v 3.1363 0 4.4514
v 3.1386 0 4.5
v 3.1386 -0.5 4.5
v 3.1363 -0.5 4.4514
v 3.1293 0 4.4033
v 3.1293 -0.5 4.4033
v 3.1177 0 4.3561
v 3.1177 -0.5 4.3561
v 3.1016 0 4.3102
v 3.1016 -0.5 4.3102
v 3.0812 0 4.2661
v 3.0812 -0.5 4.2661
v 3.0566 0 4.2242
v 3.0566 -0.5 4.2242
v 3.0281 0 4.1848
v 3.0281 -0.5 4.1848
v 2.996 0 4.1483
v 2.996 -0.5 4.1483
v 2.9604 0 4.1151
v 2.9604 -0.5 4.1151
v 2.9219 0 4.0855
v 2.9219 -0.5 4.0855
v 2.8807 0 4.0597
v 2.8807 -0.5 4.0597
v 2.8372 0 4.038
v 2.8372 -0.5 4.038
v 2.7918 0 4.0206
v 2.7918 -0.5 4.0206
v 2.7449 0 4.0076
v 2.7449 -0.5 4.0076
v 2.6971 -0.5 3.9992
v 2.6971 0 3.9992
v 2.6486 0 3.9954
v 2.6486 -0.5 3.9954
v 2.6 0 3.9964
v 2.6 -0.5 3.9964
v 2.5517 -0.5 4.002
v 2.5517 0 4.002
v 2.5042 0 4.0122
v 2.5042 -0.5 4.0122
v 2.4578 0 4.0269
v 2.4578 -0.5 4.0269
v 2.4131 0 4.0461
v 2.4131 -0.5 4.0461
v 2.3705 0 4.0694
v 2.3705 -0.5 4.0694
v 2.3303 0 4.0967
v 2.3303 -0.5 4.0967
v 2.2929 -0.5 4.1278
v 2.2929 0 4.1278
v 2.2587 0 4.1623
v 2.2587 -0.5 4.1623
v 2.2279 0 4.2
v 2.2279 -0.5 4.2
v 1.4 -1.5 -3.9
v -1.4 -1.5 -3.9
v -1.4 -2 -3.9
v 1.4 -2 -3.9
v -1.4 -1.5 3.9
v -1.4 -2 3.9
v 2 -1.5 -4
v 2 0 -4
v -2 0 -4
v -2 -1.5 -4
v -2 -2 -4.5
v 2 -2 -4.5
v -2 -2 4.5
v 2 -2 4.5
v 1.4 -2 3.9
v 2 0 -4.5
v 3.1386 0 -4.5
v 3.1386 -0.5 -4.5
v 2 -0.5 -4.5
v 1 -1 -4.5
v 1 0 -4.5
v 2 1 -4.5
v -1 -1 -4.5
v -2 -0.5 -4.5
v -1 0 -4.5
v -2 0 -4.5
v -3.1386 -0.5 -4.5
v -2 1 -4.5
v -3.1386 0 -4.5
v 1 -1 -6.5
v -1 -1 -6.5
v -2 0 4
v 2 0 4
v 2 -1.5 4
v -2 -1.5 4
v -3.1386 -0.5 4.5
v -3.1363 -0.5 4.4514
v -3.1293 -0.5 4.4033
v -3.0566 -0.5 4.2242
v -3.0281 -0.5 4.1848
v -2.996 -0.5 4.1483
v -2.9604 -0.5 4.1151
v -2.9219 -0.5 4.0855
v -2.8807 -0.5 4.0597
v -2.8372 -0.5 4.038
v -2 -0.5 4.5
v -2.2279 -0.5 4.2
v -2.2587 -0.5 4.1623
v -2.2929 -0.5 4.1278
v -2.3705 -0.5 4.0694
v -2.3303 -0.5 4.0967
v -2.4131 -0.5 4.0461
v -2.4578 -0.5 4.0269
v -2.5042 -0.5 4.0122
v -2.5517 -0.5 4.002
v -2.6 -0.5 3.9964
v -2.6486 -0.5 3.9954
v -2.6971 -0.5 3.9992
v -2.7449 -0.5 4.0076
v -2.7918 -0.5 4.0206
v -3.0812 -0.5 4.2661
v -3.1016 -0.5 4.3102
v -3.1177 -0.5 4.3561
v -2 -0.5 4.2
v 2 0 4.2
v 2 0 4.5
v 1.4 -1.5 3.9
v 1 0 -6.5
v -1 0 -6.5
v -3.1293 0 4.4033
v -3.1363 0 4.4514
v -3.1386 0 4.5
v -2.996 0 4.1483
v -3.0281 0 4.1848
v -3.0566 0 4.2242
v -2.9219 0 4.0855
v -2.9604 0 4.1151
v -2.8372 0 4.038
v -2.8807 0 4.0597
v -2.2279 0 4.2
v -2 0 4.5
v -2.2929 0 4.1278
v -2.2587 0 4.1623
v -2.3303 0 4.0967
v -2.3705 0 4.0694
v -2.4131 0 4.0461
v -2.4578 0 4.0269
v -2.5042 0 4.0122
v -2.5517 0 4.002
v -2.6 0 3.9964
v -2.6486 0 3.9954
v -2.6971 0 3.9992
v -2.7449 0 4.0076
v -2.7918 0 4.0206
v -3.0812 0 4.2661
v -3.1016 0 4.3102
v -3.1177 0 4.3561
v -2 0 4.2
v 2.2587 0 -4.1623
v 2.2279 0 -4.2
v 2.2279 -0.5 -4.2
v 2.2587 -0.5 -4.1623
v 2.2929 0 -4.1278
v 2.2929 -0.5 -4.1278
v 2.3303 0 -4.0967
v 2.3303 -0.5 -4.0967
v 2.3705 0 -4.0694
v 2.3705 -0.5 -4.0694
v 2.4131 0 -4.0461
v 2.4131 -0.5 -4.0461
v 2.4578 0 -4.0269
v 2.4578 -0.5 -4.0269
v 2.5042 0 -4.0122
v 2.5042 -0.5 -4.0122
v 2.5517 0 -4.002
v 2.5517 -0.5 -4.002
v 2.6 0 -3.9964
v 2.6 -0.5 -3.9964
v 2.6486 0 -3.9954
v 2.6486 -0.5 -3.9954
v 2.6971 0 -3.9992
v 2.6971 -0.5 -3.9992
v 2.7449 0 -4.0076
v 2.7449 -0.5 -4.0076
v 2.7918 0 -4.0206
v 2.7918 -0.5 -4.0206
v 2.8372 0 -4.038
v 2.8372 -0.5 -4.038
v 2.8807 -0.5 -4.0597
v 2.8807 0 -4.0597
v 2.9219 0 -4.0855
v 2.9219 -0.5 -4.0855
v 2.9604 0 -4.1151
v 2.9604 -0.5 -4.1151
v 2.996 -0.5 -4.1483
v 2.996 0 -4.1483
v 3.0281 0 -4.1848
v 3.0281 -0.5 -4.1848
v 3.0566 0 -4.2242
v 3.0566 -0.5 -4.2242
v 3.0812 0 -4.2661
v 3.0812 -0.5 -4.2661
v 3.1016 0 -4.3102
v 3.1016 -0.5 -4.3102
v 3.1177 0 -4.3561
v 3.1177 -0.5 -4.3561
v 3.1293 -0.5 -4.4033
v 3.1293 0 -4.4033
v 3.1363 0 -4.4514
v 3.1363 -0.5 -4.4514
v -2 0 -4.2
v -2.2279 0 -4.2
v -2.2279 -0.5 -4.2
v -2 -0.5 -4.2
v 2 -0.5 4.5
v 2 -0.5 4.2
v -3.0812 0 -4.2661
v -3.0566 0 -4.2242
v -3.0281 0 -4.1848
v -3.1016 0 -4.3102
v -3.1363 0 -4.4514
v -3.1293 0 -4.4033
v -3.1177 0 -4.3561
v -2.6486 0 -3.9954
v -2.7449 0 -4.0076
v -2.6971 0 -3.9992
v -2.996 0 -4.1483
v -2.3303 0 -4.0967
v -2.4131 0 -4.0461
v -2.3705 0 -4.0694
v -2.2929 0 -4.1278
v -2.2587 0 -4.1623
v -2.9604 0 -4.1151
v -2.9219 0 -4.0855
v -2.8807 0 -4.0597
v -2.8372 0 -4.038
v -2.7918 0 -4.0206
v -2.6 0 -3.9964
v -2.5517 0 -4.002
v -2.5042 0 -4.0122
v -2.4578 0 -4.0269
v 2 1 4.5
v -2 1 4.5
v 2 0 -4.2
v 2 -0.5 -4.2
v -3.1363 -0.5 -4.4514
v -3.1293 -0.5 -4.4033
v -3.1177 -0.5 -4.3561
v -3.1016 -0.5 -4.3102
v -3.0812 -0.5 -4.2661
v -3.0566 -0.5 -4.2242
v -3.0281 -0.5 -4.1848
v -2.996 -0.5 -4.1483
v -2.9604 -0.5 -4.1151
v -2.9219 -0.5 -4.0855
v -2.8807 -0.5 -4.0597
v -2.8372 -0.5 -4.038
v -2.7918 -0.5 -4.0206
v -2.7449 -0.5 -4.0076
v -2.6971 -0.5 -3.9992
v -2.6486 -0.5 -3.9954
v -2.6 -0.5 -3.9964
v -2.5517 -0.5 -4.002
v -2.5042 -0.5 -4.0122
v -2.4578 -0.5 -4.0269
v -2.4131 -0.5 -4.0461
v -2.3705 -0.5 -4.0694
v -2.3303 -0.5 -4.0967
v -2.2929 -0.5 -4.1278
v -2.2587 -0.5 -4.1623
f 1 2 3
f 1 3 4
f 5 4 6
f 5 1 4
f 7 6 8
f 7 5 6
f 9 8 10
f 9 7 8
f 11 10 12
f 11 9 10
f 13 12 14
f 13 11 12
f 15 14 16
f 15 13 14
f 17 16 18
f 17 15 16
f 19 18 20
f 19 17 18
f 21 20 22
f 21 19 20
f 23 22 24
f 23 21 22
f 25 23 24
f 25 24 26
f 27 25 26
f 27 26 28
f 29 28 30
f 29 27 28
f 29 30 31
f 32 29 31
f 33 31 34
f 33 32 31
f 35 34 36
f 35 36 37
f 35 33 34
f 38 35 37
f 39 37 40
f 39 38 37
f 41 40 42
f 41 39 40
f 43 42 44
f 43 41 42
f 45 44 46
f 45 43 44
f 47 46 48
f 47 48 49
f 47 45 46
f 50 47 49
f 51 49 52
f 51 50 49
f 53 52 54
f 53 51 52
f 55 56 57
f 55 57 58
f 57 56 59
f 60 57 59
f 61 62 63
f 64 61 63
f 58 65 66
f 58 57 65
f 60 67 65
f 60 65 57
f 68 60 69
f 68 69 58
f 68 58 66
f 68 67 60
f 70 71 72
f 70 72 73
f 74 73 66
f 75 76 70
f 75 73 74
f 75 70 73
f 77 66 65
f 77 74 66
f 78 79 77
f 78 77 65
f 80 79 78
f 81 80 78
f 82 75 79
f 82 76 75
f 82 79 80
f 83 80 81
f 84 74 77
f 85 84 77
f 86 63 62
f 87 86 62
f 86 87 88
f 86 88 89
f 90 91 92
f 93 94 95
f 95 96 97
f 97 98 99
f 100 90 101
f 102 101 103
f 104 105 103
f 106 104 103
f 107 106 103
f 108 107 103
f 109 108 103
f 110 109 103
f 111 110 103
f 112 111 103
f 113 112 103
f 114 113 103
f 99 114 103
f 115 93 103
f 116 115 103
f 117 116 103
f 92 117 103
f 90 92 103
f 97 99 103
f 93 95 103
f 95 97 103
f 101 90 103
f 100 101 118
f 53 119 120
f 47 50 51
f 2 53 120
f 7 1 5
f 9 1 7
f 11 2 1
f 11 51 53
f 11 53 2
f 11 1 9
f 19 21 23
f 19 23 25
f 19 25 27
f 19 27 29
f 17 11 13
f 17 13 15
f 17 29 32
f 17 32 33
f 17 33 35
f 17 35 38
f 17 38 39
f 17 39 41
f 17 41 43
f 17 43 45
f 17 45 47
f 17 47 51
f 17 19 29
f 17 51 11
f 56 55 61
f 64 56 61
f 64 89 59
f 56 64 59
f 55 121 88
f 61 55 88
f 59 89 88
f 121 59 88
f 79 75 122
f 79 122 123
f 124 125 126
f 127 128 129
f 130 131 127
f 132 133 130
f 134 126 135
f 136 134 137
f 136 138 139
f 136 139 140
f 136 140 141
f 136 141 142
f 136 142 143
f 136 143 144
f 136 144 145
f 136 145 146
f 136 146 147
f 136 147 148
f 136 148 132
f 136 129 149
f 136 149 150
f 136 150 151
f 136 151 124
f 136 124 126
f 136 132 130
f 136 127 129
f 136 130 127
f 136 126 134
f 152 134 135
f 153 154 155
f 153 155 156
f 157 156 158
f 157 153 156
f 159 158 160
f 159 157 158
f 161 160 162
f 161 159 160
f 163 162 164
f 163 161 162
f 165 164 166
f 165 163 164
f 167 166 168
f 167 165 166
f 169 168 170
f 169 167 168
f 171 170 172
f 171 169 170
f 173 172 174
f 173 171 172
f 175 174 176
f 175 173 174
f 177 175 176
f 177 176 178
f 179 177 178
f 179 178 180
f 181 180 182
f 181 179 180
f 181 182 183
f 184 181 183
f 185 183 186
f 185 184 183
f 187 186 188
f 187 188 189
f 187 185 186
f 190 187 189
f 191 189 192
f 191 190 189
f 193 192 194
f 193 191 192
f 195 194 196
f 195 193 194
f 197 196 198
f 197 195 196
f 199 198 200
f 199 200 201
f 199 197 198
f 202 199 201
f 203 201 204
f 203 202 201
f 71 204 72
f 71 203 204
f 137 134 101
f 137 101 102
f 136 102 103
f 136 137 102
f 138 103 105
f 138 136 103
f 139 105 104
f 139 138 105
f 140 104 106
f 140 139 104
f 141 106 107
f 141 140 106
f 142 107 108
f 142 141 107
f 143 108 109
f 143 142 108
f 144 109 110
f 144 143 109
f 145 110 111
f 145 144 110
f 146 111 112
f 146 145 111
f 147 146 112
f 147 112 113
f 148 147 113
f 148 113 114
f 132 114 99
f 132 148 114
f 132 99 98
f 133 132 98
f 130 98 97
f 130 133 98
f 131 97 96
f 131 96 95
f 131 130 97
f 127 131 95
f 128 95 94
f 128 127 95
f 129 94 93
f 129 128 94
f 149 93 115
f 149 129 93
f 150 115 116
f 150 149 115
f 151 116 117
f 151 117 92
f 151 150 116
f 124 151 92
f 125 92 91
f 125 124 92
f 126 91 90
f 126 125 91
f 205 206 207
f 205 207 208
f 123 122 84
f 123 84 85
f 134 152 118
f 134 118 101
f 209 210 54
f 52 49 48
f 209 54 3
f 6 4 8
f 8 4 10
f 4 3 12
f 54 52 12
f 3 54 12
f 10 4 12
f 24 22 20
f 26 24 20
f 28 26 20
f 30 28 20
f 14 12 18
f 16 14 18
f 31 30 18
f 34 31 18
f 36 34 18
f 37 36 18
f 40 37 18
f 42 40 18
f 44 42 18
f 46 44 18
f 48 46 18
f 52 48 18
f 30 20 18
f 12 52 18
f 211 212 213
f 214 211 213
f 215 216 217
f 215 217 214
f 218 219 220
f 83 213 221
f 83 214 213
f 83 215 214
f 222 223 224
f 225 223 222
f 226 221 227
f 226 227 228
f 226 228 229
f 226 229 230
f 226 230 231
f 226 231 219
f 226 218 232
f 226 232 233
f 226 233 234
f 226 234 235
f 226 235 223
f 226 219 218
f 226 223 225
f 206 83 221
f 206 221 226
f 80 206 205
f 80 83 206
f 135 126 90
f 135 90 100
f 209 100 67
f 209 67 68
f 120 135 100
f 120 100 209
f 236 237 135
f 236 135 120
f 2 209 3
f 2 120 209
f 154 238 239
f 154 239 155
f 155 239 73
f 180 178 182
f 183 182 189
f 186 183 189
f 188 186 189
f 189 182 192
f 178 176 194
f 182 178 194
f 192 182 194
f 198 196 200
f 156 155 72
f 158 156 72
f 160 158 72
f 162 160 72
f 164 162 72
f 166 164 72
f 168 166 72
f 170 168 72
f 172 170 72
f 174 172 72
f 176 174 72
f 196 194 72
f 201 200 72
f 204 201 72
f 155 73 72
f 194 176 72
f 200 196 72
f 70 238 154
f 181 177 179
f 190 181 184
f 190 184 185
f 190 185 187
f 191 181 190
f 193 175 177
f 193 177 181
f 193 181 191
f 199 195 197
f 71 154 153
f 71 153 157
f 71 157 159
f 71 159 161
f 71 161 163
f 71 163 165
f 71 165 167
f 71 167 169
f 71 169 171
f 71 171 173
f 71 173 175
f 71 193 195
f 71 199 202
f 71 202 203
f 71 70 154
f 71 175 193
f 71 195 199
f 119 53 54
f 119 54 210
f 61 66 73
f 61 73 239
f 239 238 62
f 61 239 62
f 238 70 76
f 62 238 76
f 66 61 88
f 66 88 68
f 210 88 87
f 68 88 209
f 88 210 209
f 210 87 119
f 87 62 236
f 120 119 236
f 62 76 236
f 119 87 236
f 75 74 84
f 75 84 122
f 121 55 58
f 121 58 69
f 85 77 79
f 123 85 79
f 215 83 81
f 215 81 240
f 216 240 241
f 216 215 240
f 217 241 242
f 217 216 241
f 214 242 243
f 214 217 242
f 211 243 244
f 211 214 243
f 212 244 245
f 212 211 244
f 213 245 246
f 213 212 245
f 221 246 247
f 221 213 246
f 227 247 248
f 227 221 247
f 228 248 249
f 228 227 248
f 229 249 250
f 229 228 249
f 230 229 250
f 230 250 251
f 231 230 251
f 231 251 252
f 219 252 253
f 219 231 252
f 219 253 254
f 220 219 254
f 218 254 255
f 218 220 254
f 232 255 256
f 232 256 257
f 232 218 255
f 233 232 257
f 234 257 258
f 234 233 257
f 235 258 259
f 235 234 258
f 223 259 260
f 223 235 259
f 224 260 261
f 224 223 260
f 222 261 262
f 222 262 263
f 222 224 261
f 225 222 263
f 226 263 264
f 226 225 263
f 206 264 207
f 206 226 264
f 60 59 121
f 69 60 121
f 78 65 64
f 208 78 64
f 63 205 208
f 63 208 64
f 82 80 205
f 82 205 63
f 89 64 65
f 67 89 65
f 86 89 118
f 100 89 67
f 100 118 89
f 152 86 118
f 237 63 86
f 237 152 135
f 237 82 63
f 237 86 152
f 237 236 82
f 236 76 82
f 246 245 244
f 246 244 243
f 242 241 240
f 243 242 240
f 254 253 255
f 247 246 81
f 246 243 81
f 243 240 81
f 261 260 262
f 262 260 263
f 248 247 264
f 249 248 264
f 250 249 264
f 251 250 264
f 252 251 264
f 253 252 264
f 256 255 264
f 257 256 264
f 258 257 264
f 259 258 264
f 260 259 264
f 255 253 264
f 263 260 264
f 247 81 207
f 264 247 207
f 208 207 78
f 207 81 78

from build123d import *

# Parameters (mm, degrees)
SKETCH_1_W      = 4
SKETCH_1_H      = 8
EXTRUDE_1_DEPTH = 1
SKETCH_2_W      = 4
SKETCH_2_H      = 2.5
EXTRUDE_2_DEPTH = 0.5
SKETCH_3_W      = 4
SKETCH_3_H      = 9
SKETCH_3_W_2    = 2.8
SKETCH_3_H_2    = 7.8
EXTRUDE_3_DEPTH = 0.5
EXTRUDE_4_DEPTH = 0.5
SKETCH_5_W      = 2
SKETCH_5_H      = 1
EXTRUDE_5_DEPTH = 2


with BuildPart() as part:
    # 草图1 → 凸台-拉伸1 (new body)
    with BuildSketch(Plane(origin=(0, 0, 0), x_dir=(1, 0, 0), z_dir=(0, 1, 0))):
        Rectangle(SKETCH_1_W, SKETCH_1_H)
    extrude(amount=EXTRUDE_1_DEPTH)

    # 草图2 → 凸台-拉伸2 (add)
    with BuildSketch(Plane(origin=(0, 0, -4), x_dir=(-1, 0, 0), z_dir=(0, 0, -1))):
        with Locations((0, -0.25)):
            Rectangle(SKETCH_2_W, SKETCH_2_H)
    extrude_2 = extrude(amount=EXTRUDE_2_DEPTH)

    # 镜向1: 凸台-拉伸2 across plane
    add(extrude_2.mirror(Plane.XY))

    # 草图3 → 凸台-拉伸3 (add)
    with BuildSketch(Plane.XZ.offset(1.5)):
        Rectangle(SKETCH_3_W, SKETCH_3_H)
        Rectangle(SKETCH_3_W_2, SKETCH_3_H_2, mode=Mode.SUBTRACT)
    extrude(amount=EXTRUDE_3_DEPTH)

    # 草图4 → 凸台-拉伸4 (add)
    with BuildSketch(Plane(origin=(0, 0, 0), x_dir=(1, 0, 0), z_dir=(0, 1, 0))):
        with BuildLine():
            Line((-2, 4.5), (-3.138641266, 4.5))
            ThreePointArc((-3.138641266, 4.5), (-2.791797675, 4.020569497), (-2.227919338, 4.2))
            Line((-2.227919338, 4.2), (2.227919338, 4.2))
            ThreePointArc((2.227919338, 4.2), (2.791797675, 4.020569497), (3.138641266, 4.5))
            Line((3.138641266, 4.5), (2, 4.5))
            Line((2, 4.5), (-2, 4.5))
        make_face()
        with BuildLine():
            Line((2, -4.5), (3.138641266, -4.5))
            ThreePointArc((3.138641266, -4.5), (2.791797675, -4.020569497), (2.227919338, -4.2))
            Line((2.227919338, -4.2), (-2.227919338, -4.2))
            ThreePointArc((-2.227919338, -4.2), (-2.791797675, -4.020569497), (-3.138641266, -4.5))
            Line((-3.138641266, -4.5), (-2, -4.5))
            Line((-2, -4.5), (2, -4.5))
        make_face()
    extrude(amount=-EXTRUDE_4_DEPTH)

    # 草图5 → 凸台-拉伸5 (add)
    with BuildSketch(Plane(origin=(0, 0, -4.5), x_dir=(-1, 0, 0), z_dir=(0, 0, -1))):
        with Locations((0, -0.5)):
            Rectangle(SKETCH_5_W, SKETCH_5_H)
    extrude(amount=EXTRUDE_5_DEPTH)


solid = part.part
